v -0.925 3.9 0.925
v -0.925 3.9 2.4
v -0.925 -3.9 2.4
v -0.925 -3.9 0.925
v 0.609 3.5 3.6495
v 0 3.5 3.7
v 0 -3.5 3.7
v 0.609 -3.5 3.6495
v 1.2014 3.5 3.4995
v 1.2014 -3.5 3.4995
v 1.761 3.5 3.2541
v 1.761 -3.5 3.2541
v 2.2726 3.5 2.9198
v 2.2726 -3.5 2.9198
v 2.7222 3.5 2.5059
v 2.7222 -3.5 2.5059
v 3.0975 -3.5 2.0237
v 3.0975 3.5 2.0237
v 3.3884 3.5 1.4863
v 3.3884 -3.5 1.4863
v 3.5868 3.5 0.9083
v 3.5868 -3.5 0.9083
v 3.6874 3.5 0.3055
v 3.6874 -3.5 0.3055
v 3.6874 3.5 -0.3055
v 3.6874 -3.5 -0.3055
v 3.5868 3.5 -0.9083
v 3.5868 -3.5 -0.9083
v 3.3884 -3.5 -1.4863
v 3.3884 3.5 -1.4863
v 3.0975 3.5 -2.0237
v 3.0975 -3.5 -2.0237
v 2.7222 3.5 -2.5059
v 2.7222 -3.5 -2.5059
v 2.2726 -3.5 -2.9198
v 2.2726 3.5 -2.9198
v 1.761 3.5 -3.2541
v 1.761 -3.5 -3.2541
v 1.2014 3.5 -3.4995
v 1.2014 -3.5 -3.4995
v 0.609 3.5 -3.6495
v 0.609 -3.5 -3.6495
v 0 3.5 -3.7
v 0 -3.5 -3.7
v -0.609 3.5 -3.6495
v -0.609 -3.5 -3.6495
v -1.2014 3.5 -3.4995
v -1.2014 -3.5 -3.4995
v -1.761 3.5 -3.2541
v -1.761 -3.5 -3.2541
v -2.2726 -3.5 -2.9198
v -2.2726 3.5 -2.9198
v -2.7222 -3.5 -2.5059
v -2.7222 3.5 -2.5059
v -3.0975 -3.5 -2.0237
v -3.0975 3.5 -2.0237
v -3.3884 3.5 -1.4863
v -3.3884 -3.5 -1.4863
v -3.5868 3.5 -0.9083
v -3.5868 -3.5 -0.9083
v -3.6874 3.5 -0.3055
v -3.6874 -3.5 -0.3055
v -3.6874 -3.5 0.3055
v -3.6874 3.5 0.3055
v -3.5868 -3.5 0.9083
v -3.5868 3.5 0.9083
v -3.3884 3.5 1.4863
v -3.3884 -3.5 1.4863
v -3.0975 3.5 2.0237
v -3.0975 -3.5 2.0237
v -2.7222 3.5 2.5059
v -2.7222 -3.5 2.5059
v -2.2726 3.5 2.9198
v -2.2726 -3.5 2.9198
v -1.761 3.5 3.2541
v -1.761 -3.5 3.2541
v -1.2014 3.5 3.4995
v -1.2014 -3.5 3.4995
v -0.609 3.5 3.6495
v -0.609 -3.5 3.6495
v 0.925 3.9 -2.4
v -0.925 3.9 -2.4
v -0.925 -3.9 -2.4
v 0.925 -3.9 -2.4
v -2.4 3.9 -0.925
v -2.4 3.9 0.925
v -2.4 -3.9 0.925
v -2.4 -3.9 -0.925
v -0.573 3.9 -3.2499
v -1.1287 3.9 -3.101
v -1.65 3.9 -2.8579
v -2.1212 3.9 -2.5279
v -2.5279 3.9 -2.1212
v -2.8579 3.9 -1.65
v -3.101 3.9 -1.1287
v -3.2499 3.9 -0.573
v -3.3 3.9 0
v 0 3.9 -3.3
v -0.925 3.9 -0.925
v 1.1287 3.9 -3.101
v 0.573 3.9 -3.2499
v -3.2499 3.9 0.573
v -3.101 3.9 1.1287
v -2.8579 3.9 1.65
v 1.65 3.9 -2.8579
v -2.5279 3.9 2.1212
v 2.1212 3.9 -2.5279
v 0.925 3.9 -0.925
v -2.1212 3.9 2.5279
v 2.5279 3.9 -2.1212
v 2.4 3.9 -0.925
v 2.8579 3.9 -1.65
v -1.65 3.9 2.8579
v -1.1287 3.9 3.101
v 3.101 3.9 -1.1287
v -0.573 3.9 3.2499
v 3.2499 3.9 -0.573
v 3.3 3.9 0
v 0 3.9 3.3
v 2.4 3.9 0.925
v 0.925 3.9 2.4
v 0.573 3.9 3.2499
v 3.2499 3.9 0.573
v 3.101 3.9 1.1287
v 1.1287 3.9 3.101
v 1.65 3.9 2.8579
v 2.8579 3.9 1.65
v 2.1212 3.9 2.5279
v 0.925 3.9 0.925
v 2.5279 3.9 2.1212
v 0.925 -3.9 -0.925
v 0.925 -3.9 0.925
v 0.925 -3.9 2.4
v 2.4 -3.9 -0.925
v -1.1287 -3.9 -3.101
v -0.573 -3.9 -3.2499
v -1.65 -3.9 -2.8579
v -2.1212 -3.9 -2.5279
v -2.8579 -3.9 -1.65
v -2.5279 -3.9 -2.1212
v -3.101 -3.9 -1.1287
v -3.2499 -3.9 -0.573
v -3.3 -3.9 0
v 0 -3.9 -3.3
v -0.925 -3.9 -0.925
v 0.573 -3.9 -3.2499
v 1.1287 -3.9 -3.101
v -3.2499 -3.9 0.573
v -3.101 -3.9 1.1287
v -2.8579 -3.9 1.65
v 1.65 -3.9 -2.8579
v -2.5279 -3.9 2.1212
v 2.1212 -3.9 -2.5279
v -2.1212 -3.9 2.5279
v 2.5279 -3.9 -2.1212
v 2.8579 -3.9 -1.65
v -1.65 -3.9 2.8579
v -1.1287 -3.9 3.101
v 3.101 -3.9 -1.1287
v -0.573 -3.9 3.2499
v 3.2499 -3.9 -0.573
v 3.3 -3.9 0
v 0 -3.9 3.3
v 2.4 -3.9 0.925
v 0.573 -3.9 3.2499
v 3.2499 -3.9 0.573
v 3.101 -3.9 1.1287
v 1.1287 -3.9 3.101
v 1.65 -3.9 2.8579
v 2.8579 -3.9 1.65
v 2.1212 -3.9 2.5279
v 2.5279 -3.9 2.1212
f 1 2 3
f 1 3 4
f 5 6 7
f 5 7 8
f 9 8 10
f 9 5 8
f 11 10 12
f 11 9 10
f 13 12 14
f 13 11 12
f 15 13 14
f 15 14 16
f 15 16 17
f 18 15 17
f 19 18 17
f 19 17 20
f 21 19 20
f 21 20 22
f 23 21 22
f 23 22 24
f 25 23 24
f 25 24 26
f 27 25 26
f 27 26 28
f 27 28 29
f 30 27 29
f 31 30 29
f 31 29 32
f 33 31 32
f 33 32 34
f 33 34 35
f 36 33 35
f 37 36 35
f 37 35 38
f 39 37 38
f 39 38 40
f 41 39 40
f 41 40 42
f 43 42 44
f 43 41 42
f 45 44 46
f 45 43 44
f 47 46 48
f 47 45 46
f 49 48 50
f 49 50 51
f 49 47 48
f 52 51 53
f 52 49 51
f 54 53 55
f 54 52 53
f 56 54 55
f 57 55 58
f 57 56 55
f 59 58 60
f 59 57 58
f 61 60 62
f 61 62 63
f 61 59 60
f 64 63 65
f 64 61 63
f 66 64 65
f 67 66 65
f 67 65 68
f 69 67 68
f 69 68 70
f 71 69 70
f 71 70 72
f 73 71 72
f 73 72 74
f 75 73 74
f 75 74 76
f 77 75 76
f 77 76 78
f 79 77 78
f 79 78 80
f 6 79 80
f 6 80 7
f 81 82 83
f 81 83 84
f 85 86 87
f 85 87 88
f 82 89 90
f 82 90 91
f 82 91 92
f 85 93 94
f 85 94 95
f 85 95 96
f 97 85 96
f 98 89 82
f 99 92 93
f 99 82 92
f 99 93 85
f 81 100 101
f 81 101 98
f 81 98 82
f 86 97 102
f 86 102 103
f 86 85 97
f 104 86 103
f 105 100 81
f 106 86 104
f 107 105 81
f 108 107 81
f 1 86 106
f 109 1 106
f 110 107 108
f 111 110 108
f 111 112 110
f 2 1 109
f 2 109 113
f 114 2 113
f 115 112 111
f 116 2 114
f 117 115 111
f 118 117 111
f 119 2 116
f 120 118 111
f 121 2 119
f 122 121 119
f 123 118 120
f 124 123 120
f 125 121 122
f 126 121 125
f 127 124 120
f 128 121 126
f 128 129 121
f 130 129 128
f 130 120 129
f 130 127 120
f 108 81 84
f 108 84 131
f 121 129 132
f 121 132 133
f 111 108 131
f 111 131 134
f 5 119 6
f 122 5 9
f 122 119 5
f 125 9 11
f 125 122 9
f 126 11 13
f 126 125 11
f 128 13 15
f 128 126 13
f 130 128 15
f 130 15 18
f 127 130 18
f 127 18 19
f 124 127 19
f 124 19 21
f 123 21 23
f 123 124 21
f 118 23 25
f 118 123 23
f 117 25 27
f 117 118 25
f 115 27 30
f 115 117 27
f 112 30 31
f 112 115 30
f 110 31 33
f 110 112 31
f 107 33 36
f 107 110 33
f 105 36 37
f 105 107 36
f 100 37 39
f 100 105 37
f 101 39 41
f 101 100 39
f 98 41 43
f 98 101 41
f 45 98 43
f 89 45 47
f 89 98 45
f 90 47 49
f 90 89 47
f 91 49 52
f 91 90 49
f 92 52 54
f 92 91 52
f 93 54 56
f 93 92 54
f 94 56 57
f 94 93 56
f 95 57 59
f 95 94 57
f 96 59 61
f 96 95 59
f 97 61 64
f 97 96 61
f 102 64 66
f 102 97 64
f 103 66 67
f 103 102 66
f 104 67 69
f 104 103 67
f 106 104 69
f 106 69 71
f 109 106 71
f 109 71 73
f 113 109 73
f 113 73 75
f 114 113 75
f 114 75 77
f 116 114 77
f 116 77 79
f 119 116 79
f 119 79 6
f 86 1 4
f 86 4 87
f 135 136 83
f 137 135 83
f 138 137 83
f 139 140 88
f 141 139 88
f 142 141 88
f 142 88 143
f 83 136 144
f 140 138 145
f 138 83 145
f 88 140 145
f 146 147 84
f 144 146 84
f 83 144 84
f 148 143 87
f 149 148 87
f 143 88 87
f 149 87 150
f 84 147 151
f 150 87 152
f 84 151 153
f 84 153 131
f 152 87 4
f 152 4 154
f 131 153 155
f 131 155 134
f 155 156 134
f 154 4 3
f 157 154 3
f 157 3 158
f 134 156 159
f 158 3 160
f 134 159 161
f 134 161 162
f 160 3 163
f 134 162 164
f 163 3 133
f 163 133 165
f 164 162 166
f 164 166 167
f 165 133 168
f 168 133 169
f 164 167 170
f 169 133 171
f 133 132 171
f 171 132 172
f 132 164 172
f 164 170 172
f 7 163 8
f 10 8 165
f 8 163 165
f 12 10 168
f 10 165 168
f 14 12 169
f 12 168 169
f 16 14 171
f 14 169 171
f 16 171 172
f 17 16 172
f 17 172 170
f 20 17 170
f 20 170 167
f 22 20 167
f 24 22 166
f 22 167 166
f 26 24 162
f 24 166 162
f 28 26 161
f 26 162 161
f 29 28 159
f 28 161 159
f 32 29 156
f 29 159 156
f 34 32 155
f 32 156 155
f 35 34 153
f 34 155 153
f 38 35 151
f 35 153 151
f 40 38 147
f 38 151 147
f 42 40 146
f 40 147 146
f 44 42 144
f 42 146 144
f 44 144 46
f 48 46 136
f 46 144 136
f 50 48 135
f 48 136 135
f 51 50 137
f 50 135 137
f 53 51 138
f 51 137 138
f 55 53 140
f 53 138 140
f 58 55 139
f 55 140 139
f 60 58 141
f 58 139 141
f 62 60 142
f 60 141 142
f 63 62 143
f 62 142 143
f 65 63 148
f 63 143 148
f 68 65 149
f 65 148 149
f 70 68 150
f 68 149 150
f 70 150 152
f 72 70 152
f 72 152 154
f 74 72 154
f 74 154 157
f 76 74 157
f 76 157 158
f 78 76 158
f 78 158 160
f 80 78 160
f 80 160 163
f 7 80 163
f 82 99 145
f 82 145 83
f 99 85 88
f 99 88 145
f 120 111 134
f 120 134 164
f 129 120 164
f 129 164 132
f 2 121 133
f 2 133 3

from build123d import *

# Parameters (mm, degrees)
SKETCH1_R           = 3.7
BOSS_EXTRUDE1_DEPTH = 3.9
CUT_EXTRUDE1_DEPTH  = 10.392550239
CHAMFER1_SIZE       = 0.4


with BuildPart() as part:
    # Sketch1 → Boss-Extrude1 (new, symmetric)
    with BuildSketch(Plane(origin=(0, 0, 0), x_dir=(1, 0, 0), z_dir=(0, 1, 0))):
        with Locations(Location((0, 0, 0), (0, 0, 270))):
            Circle(SKETCH1_R)
    extrude(amount=BOSS_EXTRUDE1_DEPTH, both=True)

    # Sketch2 → Cut-Extrude1 (cut, through all)
    with BuildSketch(Plane(origin=(0, 3.9, 0), x_dir=(1, 0, 0), z_dir=(0, 1, 0))):
        Polygon((0.925, 0.925), (2.4, 0.925), (2.4, -0.925), (0.925, -0.925), (0.925, -2.4), (-0.925, -2.4), (-0.925, -0.925), (-2.4, -0.925), (-2.4, 0.925), (-0.925, 0.925), (-0.925, 2.4), (0.925, 2.4), align=None)
    extrude(amount=-CUT_EXTRUDE1_DEPTH, mode=Mode.SUBTRACT)

    # Chamfer1
    chamfer1_edges = [part.edges().sort_by_distance(p)[0] for p in [
        (0, -3.9, -3.7),
        (0, 3.9, -3.7),
    ]]
    chamfer(chamfer1_edges, length=CHAMFER1_SIZE)


solid = part.part
